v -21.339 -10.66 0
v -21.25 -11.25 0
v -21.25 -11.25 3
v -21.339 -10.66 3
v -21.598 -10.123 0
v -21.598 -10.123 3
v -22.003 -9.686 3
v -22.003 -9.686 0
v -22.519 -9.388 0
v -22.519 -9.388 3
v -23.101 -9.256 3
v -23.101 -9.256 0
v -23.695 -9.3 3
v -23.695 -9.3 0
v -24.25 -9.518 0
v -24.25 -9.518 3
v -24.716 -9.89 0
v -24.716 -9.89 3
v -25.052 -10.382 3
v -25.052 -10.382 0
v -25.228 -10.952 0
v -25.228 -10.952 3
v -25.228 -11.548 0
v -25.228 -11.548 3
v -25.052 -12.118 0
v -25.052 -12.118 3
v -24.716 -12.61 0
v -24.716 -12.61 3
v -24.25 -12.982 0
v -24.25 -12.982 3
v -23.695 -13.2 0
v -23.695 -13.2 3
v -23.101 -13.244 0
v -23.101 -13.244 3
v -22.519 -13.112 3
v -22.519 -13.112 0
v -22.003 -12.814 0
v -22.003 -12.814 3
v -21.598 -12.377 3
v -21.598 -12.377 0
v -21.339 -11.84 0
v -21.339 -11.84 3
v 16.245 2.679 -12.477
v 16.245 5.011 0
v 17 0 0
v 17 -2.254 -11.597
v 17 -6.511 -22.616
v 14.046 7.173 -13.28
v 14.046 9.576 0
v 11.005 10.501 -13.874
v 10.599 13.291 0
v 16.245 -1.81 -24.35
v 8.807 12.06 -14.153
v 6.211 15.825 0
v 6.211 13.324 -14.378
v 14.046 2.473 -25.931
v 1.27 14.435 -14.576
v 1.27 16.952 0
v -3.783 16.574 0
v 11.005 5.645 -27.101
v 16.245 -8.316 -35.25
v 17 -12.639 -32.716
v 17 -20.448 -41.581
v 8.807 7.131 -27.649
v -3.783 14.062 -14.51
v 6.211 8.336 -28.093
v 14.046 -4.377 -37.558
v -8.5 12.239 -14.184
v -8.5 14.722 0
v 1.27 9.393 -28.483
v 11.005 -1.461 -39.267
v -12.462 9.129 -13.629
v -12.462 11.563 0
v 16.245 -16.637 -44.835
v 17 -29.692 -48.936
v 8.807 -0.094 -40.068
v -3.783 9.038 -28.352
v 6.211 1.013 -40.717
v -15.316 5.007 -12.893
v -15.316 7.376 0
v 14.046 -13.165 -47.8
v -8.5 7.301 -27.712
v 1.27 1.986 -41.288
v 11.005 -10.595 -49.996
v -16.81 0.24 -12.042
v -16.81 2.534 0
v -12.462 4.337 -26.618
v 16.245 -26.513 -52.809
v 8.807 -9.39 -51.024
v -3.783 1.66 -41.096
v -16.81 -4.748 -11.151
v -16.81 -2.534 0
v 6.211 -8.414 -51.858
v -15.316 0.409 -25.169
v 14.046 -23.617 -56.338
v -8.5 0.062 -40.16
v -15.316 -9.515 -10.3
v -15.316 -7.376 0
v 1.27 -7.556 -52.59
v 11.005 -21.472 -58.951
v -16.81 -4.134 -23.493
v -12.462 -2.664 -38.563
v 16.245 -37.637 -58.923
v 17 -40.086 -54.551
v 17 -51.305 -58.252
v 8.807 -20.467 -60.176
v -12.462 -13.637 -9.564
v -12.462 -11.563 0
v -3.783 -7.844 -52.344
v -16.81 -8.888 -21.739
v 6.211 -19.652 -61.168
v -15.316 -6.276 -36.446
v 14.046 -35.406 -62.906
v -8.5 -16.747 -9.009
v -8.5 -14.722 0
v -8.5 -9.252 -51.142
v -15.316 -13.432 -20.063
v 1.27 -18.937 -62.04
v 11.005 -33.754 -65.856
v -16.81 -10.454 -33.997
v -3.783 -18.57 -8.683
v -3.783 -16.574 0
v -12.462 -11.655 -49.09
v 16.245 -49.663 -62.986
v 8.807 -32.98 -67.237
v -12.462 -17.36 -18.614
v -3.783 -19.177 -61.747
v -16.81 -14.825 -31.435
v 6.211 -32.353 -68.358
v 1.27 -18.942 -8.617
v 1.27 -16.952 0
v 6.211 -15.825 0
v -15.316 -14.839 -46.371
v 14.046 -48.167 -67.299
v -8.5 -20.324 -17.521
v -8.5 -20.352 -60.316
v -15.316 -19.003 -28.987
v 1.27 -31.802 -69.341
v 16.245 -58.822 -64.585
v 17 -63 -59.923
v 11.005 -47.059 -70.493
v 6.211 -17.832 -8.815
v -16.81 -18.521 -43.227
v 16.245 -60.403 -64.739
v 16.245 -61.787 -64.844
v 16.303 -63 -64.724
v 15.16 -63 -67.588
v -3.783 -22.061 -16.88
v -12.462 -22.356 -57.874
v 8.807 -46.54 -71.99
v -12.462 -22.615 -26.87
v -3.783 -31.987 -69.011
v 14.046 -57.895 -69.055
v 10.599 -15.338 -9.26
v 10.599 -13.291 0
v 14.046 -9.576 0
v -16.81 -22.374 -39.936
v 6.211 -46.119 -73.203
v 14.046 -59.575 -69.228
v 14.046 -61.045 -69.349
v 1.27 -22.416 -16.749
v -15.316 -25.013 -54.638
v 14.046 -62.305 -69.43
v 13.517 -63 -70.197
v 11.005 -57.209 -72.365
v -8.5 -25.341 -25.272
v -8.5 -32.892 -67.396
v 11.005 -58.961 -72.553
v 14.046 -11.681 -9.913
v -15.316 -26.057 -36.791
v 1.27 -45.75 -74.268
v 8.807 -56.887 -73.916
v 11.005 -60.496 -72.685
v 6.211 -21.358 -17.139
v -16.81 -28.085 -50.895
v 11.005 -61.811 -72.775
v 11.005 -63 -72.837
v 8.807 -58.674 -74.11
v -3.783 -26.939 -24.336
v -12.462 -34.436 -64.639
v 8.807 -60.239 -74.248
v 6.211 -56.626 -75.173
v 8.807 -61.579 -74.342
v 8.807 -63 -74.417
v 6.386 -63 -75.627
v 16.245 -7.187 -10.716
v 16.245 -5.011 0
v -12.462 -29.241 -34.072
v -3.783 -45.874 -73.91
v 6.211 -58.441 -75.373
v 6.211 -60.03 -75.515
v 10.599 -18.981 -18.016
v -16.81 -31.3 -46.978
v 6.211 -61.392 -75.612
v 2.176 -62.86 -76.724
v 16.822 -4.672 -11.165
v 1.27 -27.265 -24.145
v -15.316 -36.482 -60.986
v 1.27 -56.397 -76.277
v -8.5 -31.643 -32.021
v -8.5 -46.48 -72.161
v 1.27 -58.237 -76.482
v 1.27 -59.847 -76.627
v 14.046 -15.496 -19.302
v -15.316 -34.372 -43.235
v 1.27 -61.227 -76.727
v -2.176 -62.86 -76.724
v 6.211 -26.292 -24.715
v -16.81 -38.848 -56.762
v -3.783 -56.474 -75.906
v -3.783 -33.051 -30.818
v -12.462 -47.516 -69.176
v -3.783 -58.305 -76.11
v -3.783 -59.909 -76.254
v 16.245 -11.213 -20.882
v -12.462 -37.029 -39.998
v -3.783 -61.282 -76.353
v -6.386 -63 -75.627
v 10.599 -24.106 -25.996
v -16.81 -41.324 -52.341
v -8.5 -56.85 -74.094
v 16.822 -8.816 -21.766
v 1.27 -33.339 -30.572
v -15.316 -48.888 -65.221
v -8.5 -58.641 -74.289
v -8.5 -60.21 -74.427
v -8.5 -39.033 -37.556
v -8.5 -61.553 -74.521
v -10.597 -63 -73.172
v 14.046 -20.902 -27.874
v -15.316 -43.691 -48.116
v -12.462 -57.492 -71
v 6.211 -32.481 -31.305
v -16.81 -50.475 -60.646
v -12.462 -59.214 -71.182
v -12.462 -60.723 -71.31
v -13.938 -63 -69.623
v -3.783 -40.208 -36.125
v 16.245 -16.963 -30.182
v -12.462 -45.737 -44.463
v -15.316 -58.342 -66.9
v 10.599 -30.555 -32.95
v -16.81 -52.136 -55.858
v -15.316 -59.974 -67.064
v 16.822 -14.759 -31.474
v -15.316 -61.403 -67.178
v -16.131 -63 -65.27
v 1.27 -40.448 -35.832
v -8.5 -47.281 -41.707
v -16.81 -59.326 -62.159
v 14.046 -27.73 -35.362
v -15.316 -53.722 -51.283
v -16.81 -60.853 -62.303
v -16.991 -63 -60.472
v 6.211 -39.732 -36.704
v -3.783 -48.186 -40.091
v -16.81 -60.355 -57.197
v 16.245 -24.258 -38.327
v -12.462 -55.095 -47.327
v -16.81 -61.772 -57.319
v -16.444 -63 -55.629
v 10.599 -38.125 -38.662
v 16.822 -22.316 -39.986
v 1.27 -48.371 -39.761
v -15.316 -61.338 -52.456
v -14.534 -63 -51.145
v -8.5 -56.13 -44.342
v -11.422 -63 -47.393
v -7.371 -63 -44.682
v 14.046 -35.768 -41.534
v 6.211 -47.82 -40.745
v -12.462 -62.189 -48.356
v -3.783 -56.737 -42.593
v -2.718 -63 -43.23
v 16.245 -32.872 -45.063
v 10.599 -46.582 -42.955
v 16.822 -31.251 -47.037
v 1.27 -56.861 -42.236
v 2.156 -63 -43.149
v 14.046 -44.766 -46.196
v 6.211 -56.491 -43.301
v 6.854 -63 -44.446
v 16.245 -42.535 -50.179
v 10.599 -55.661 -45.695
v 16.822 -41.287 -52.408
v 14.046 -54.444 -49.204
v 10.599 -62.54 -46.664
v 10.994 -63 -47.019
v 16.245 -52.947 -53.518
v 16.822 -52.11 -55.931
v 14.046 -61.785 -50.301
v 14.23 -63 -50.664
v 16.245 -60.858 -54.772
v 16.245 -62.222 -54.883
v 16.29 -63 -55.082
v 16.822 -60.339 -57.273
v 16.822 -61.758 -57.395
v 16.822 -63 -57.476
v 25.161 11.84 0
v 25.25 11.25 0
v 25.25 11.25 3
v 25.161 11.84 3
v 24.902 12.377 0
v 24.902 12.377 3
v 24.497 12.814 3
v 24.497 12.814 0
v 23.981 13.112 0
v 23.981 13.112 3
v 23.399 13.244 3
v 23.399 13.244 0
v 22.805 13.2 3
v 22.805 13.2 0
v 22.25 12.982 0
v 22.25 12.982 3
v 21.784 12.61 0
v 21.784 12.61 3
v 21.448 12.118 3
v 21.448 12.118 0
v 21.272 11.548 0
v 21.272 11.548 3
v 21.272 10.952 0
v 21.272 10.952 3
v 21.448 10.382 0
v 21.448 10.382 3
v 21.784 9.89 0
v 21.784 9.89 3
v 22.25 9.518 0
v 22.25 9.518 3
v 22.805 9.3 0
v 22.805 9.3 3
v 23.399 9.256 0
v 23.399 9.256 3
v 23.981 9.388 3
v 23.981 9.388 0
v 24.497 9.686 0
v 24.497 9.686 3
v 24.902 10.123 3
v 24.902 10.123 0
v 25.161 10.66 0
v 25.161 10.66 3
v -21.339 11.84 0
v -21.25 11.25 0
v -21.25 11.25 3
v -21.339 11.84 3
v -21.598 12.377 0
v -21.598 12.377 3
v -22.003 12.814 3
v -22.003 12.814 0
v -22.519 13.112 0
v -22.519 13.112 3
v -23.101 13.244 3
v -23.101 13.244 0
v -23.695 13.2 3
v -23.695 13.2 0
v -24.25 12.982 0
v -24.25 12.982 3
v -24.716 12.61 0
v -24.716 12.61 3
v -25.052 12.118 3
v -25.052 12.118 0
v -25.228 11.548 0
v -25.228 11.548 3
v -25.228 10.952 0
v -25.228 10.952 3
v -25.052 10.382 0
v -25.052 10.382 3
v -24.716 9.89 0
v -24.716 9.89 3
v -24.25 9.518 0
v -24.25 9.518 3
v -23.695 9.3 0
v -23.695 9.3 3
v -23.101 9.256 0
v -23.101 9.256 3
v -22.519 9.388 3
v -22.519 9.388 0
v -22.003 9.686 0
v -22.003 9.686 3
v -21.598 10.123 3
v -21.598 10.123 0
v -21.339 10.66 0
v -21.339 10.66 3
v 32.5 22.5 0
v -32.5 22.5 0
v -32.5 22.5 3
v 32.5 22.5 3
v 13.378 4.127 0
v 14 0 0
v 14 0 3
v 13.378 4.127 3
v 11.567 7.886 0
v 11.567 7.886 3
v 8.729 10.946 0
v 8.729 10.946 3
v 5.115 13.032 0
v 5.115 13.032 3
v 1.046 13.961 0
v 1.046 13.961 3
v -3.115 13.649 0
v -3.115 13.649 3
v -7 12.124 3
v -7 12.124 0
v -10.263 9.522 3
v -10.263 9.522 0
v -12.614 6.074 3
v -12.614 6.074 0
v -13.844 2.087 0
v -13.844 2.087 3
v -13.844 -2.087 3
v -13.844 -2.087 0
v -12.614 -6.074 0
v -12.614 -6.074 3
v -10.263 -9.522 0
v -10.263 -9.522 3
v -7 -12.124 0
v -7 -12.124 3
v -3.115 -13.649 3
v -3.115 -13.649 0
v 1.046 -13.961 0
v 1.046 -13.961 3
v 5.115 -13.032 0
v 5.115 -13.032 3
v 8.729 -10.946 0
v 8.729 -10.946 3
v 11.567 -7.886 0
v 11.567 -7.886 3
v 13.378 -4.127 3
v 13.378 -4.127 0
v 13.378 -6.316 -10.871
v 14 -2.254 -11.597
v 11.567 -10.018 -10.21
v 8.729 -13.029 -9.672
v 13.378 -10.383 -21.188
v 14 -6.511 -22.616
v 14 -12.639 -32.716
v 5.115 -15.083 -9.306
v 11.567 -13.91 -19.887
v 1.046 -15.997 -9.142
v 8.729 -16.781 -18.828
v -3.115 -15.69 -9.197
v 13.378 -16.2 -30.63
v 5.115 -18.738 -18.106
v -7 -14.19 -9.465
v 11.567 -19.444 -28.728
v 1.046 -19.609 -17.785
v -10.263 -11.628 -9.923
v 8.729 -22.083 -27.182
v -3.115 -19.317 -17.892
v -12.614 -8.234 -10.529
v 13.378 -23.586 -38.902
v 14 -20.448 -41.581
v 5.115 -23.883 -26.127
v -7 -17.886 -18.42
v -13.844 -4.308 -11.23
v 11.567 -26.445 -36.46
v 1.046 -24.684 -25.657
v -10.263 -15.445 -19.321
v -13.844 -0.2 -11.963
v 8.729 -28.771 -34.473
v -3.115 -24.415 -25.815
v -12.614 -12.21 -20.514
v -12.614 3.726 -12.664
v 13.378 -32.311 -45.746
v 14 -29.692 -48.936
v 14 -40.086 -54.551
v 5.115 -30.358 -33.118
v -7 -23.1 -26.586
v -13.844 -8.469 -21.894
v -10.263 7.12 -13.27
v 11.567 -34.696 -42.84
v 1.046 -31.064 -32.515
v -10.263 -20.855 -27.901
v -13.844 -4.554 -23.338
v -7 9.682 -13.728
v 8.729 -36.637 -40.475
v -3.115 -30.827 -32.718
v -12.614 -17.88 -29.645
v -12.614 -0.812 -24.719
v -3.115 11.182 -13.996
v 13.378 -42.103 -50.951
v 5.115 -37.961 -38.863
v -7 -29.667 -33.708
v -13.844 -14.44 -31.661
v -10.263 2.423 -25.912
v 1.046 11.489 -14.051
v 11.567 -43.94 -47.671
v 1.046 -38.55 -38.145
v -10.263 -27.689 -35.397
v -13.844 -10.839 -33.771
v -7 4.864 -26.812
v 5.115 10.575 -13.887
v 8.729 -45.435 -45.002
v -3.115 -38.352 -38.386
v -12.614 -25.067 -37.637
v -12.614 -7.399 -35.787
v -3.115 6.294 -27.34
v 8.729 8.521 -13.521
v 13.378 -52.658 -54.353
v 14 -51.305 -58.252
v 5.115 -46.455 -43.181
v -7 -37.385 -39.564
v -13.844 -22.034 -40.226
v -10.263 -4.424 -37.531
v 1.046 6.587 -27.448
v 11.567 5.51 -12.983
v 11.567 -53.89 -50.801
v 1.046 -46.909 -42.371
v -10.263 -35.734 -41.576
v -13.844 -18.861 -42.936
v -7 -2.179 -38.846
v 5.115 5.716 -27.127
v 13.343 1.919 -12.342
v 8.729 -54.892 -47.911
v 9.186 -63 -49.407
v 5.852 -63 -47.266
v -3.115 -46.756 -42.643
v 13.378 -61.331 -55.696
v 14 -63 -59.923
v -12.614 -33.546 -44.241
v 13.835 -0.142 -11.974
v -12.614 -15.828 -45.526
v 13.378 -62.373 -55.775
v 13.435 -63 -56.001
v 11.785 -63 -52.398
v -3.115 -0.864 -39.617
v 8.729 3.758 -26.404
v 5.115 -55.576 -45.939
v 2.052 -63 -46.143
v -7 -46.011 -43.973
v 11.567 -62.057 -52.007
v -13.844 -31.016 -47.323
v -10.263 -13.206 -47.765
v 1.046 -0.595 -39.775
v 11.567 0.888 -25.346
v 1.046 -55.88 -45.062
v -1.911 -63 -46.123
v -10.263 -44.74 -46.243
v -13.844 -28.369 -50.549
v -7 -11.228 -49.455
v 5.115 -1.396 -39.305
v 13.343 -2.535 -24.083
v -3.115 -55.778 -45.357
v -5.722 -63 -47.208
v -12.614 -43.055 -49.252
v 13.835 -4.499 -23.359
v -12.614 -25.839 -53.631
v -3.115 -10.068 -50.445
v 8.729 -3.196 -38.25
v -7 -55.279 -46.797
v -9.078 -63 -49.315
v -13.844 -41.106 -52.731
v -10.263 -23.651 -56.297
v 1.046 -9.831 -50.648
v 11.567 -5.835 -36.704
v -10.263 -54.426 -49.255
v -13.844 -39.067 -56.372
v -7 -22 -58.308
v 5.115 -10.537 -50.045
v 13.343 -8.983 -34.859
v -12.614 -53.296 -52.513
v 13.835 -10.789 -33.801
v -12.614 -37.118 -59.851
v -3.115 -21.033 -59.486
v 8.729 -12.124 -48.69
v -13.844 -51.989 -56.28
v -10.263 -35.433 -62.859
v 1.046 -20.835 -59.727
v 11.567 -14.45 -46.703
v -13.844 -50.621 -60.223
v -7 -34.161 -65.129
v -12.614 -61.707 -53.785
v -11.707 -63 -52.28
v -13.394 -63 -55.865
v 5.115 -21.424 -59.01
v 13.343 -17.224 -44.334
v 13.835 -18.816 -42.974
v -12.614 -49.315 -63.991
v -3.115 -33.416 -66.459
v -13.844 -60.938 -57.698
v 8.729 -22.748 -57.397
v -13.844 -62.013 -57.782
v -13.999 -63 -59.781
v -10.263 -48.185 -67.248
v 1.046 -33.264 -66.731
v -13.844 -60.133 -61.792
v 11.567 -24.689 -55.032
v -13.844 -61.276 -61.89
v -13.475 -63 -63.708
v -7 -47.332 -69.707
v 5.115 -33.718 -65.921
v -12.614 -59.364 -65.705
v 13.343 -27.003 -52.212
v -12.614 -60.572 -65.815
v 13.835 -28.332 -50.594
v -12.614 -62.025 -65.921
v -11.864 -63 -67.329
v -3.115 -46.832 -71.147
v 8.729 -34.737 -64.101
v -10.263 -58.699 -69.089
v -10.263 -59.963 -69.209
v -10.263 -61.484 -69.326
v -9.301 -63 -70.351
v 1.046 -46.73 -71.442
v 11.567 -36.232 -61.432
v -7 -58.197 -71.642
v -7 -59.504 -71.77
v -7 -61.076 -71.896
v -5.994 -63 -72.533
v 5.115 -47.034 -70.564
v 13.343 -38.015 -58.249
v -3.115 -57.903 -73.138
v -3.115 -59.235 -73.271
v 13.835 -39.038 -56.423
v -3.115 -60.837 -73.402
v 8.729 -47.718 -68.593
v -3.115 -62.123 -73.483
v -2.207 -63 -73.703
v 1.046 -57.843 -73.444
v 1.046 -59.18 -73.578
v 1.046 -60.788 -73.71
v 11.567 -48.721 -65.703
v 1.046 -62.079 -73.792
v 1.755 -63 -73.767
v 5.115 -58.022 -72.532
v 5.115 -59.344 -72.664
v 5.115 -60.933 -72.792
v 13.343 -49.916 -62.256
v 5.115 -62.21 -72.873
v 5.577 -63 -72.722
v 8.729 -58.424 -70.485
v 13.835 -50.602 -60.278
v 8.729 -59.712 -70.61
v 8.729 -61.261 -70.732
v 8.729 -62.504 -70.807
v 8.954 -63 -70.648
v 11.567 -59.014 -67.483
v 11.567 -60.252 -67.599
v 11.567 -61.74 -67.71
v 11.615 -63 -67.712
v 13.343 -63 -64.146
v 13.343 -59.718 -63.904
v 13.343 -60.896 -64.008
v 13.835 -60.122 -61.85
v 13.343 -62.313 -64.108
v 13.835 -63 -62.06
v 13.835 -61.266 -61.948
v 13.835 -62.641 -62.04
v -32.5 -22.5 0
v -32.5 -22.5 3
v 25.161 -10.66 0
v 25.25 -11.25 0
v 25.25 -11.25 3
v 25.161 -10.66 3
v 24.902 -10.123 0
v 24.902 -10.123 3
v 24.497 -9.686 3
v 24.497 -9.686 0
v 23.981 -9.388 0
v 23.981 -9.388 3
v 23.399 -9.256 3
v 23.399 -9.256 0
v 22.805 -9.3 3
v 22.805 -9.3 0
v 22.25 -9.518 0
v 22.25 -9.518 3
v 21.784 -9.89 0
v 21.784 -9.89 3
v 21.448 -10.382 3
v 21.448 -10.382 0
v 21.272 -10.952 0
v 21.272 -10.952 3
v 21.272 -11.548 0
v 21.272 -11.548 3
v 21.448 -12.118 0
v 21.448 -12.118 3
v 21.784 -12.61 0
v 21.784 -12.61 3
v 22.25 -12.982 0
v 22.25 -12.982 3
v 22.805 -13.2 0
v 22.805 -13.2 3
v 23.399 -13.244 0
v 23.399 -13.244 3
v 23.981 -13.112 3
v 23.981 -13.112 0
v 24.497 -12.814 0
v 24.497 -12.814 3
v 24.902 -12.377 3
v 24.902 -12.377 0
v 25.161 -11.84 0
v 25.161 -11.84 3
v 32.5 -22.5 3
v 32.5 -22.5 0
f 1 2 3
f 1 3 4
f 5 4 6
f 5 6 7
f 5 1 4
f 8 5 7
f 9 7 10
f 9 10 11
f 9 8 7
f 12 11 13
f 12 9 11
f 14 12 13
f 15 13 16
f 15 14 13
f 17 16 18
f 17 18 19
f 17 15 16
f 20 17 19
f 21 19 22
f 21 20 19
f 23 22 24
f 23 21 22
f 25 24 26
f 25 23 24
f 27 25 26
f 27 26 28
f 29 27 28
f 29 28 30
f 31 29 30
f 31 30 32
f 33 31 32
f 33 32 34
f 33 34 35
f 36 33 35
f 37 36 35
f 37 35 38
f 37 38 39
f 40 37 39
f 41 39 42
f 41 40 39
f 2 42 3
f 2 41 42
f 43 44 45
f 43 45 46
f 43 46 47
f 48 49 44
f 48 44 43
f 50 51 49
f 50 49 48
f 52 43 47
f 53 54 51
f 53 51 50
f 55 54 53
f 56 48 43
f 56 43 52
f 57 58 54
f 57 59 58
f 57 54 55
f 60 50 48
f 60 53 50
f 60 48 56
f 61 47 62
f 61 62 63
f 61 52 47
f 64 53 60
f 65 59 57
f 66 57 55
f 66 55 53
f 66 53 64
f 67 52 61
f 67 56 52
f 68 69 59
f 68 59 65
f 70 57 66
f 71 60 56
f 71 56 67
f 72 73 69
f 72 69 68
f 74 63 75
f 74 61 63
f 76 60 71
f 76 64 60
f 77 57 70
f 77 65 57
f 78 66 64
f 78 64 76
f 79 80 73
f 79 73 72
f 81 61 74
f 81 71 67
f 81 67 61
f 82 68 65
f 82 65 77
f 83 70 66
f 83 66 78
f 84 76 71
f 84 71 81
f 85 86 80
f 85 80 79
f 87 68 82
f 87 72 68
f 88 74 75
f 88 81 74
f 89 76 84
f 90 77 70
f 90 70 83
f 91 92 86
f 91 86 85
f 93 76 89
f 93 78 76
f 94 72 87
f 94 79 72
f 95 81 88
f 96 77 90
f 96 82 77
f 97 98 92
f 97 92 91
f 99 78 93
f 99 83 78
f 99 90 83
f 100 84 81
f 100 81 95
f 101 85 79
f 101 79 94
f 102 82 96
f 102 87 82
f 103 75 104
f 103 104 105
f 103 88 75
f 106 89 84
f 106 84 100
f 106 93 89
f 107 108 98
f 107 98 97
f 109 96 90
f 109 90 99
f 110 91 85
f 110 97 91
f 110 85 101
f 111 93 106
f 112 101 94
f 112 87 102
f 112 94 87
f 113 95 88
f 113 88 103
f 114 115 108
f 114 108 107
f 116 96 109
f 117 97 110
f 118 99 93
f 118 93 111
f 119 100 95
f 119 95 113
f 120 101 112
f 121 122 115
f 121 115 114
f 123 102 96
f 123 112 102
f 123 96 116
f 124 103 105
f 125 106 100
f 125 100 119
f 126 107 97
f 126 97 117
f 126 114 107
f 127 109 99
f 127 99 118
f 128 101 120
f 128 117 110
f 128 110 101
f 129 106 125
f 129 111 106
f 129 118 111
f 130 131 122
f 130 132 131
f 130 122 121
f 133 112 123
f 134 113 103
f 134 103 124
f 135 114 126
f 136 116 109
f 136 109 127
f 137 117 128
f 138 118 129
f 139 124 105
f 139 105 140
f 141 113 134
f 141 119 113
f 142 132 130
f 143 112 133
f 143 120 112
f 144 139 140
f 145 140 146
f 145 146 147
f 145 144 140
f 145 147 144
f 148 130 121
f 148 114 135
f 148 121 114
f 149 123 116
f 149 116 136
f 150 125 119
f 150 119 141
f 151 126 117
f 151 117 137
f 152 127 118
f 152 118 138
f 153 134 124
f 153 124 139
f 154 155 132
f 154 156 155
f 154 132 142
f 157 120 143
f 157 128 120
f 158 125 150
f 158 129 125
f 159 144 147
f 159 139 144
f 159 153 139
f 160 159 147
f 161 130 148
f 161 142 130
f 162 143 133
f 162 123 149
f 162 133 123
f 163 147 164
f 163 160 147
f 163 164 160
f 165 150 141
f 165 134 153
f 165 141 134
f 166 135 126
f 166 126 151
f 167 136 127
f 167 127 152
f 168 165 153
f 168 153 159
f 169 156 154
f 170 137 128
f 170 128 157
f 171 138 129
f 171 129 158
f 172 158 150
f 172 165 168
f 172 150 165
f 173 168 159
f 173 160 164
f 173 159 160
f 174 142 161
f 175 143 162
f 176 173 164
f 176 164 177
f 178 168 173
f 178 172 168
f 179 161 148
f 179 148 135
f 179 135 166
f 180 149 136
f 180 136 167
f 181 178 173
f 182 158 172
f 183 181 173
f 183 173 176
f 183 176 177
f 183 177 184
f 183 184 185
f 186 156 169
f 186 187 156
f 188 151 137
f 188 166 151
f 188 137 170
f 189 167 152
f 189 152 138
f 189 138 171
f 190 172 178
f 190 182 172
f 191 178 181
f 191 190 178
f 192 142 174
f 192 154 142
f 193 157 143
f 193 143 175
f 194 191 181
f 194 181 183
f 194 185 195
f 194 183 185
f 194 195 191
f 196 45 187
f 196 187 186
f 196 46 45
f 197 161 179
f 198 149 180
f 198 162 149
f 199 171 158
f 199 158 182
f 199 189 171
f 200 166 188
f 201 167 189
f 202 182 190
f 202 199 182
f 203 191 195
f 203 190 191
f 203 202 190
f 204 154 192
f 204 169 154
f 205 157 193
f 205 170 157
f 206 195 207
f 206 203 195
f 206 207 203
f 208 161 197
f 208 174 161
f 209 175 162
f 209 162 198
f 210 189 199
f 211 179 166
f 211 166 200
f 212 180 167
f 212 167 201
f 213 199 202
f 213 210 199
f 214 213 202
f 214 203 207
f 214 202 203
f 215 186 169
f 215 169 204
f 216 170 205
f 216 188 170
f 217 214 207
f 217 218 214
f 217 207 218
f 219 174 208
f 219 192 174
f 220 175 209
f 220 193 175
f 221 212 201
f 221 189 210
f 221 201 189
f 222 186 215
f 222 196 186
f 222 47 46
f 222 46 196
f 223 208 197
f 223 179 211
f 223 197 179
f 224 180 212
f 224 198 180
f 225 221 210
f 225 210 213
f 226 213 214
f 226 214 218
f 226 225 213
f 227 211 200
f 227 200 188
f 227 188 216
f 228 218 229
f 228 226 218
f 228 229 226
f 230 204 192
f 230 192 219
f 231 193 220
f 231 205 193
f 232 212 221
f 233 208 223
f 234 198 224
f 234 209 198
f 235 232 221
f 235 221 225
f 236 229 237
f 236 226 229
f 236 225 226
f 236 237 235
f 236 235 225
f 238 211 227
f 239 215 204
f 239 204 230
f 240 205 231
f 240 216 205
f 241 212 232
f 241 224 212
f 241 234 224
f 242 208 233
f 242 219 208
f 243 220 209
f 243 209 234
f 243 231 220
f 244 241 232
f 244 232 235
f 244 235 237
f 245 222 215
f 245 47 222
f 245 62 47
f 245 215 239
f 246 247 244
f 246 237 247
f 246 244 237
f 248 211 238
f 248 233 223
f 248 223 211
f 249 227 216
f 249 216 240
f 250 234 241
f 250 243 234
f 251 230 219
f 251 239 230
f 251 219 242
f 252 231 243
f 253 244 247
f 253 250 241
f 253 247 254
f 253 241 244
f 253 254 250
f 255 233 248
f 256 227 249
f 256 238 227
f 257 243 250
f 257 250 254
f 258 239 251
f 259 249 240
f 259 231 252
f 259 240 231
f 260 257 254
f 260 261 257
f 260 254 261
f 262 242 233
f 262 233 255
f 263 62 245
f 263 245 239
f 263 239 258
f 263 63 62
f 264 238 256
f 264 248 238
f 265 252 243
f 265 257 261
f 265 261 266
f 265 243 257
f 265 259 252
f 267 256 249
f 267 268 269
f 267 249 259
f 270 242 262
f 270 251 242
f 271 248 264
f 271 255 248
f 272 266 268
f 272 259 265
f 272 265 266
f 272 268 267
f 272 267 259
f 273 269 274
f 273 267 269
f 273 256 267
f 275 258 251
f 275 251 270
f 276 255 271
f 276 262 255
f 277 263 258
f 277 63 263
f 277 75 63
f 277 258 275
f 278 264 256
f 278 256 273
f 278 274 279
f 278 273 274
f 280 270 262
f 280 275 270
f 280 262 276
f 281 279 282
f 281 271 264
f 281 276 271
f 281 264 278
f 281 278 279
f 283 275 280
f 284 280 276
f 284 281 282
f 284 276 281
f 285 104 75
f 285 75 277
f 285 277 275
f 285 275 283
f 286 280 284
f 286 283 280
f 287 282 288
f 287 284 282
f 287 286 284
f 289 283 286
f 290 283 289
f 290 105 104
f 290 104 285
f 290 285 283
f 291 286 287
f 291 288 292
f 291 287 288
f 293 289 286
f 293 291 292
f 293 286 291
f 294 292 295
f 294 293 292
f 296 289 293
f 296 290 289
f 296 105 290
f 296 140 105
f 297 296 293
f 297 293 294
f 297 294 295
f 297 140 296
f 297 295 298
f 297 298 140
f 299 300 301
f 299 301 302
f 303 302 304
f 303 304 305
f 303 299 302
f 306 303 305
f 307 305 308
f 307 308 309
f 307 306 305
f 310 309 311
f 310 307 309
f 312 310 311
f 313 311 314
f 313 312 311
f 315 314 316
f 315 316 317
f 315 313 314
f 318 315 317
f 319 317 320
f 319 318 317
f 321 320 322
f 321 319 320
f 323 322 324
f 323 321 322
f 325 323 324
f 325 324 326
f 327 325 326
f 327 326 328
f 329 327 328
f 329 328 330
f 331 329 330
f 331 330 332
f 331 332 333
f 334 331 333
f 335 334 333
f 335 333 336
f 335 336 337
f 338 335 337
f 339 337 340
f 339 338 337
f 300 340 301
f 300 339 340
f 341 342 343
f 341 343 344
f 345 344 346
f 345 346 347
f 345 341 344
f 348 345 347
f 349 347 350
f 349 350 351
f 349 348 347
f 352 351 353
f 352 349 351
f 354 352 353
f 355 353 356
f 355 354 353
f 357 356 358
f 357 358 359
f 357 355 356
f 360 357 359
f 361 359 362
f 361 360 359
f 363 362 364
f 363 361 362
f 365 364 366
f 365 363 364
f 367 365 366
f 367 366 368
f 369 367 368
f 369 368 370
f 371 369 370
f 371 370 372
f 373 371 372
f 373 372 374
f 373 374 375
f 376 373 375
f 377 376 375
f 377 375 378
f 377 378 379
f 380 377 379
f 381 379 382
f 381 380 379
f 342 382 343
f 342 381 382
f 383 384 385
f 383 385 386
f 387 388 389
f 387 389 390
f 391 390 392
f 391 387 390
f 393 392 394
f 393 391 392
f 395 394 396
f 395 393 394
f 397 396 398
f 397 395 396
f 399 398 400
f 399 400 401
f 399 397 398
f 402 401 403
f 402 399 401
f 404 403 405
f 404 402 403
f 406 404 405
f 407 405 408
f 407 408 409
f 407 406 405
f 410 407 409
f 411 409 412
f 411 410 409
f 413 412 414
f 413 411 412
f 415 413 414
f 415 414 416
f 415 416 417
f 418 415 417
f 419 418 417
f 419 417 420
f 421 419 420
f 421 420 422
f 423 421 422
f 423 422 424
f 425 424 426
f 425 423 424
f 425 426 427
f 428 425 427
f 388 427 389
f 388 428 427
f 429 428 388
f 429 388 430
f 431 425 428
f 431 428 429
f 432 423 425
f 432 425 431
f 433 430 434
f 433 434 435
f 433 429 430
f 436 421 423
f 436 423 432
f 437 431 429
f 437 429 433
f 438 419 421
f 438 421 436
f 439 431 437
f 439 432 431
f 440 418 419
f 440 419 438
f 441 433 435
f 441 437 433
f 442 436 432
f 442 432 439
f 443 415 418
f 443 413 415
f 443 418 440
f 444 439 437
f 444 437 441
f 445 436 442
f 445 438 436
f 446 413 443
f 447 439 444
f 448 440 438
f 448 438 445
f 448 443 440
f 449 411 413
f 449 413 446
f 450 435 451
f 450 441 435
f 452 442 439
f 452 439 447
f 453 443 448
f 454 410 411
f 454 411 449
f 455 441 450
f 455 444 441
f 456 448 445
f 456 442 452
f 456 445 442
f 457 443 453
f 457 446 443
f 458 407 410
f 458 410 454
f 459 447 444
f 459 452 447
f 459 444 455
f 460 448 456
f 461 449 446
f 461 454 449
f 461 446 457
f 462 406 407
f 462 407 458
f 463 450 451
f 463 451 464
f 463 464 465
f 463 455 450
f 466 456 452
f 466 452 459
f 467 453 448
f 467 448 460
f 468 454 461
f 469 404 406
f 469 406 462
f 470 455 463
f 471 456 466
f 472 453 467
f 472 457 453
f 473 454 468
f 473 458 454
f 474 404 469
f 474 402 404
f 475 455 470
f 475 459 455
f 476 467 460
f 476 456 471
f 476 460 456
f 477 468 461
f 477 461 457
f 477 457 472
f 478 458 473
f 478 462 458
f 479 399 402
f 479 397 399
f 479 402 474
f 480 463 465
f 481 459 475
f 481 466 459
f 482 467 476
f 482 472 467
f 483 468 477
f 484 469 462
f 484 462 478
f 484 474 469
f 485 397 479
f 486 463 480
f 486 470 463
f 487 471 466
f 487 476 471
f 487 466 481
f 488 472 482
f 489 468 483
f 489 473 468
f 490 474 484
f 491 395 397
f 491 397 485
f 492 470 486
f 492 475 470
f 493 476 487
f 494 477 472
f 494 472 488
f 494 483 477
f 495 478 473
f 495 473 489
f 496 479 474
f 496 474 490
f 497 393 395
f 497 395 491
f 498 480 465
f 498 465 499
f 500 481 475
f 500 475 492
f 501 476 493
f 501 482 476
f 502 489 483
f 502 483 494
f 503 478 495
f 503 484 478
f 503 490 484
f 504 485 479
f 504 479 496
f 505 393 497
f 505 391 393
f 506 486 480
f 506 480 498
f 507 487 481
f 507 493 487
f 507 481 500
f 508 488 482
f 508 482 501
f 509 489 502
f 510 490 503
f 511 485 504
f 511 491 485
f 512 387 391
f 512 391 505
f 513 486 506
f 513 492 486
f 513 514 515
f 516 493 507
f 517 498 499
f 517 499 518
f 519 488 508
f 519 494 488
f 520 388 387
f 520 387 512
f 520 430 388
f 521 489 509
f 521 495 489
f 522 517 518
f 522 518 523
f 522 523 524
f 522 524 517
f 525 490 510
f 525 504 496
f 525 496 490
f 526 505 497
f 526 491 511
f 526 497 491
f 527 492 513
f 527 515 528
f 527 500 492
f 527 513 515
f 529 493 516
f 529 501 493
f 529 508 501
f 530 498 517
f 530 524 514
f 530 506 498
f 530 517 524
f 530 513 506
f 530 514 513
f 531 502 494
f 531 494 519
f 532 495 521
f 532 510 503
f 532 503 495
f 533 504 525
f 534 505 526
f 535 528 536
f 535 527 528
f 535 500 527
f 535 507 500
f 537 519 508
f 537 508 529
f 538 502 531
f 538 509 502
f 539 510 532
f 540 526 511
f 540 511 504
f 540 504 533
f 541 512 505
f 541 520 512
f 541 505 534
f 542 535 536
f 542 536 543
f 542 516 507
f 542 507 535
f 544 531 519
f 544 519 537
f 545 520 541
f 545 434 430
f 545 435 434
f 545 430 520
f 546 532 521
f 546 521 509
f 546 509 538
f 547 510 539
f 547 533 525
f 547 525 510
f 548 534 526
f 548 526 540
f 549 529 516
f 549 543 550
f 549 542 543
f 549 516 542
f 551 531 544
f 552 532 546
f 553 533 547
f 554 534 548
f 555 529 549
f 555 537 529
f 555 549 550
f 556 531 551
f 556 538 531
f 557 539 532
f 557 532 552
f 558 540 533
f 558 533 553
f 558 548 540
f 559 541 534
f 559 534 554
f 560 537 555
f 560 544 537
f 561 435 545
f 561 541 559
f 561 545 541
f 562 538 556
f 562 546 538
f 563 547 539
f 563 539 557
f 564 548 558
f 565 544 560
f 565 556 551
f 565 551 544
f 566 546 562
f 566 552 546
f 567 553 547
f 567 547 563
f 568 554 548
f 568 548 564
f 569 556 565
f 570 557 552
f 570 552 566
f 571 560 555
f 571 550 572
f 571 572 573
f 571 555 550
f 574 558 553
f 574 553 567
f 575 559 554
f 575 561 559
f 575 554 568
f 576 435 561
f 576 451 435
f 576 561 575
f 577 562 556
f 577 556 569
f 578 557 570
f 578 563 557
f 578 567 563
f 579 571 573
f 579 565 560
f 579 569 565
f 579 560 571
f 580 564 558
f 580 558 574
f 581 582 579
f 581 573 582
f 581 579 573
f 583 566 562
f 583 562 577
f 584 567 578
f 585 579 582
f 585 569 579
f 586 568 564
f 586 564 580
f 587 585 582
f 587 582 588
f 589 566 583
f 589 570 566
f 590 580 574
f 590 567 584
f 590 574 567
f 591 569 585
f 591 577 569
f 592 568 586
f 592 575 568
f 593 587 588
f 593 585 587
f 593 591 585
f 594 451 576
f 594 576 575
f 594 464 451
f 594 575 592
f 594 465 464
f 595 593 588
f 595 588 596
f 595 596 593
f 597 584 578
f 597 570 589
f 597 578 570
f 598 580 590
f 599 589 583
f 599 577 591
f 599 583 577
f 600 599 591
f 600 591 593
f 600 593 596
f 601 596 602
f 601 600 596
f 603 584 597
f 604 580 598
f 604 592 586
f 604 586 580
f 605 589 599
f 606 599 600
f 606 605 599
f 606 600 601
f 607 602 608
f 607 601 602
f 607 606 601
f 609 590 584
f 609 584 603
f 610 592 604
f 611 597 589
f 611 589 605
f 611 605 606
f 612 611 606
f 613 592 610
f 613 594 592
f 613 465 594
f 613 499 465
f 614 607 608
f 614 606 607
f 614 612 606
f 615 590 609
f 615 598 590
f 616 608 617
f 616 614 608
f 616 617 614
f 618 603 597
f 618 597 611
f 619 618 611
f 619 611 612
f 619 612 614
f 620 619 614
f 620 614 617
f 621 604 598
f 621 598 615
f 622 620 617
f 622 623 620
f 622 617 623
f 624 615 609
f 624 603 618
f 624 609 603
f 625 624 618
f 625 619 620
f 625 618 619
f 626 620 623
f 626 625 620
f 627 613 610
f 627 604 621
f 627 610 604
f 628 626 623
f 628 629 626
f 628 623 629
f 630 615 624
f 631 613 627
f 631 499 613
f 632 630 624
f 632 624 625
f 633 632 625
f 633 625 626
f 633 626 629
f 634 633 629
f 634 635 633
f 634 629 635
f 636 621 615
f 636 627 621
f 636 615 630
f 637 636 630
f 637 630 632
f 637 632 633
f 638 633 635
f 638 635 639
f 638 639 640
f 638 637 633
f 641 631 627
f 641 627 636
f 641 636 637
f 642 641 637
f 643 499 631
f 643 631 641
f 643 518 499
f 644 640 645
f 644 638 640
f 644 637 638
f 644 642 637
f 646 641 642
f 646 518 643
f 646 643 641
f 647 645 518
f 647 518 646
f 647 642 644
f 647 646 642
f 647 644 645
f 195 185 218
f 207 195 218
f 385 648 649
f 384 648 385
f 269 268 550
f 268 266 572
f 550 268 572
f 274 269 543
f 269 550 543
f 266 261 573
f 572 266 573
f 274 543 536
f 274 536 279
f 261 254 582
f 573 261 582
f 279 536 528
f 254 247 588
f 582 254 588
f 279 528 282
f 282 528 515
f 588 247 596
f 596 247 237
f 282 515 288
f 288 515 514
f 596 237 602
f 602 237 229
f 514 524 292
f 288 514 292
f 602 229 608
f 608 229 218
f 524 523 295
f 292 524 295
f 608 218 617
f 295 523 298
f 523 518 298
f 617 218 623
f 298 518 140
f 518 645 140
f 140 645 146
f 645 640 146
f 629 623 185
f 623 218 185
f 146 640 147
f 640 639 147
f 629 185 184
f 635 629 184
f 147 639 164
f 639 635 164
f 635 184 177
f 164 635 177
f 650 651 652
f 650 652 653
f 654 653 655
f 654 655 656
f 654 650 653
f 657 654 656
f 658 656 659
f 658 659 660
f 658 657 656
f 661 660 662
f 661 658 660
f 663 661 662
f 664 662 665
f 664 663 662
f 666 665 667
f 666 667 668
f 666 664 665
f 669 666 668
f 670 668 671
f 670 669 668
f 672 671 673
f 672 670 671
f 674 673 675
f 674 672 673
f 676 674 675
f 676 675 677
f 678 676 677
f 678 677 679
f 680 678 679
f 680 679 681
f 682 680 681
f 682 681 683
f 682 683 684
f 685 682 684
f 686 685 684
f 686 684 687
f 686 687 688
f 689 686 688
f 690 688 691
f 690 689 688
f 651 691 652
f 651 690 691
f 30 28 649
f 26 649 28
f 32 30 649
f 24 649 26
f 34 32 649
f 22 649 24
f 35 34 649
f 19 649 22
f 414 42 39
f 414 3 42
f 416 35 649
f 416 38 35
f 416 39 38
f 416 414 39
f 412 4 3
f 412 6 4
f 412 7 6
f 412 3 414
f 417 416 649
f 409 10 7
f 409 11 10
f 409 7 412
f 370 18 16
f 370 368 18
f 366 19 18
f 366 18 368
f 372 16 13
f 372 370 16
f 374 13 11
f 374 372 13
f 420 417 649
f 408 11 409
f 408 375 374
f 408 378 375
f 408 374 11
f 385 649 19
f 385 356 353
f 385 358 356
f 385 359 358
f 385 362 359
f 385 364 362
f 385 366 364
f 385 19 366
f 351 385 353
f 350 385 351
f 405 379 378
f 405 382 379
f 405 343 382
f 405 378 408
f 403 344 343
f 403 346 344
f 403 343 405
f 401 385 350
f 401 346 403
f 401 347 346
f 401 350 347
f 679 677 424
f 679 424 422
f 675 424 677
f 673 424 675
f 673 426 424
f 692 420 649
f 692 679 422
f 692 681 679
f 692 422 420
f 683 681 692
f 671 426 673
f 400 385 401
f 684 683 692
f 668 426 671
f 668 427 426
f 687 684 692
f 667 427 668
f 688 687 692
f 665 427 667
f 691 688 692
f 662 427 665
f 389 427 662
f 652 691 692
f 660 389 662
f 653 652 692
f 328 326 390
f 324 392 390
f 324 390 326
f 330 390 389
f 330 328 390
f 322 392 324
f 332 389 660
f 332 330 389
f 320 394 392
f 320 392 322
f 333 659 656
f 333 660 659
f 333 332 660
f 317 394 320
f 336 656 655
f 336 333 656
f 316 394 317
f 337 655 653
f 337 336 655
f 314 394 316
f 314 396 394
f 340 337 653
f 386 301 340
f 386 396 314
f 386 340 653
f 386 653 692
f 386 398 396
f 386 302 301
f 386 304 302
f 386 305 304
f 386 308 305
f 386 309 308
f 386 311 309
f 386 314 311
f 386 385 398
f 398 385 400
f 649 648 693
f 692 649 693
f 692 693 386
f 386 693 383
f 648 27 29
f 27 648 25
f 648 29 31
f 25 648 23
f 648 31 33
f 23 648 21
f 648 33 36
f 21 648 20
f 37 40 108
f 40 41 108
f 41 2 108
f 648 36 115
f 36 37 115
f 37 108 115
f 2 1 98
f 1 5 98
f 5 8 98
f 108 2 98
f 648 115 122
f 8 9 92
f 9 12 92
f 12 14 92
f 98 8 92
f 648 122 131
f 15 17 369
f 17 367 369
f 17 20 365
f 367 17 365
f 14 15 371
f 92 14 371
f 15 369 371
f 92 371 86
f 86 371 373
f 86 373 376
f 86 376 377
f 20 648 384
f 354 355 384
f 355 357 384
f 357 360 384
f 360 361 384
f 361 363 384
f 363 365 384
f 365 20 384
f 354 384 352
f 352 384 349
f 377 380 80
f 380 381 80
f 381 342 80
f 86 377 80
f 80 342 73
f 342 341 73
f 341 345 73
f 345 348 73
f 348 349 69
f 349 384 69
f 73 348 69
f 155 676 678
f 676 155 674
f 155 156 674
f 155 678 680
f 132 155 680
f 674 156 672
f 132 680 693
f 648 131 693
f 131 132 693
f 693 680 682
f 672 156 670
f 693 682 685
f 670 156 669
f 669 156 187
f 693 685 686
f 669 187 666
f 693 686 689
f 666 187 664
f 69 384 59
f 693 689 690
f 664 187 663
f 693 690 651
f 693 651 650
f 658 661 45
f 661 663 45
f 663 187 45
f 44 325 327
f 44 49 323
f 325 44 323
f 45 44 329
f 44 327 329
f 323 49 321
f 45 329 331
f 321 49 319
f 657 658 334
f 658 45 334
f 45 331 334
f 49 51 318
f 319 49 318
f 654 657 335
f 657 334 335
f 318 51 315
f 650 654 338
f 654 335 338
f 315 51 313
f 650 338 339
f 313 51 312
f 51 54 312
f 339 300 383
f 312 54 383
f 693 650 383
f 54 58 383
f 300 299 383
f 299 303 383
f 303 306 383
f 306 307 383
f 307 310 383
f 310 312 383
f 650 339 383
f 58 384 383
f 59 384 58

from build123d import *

# Parameters (mm, degrees)
ESQUISSE1_R             = 17
ESQUISSE1_R_2           = 14
ESQUISSE3_W             = 65
ESQUISSE3_H             = 45
ESQUISSE3_R             = 14
ESQUISSE3_R_2           = 2
BOSS_EXTRU_1_DEPTH      = 3
ESQUISSE4_W             = 56.431647226
ESQUISSE4_H             = 36.329386627
ENL_V_MAT_EXTRU_1_DEPTH = 10


with BuildPart() as part:
    # Balayage1: sweep along a path in Esquisse2
    with BuildLine(Plane(origin=(0, 0, 0), x_dir=(0, 0, -1), z_dir=(1, 0, 0))) as balayage1_path:
        ThreePointArc((0, 0), (42.265649833, -21.177861693), (60, -65))
    # Esquisse1 → Balayage1 (sweep)
    with BuildSketch(Plane.XY):
        Circle(ESQUISSE1_R)
        Circle(ESQUISSE1_R_2, mode=Mode.SUBTRACT)
    sweep(path=balayage1_path.line)

    # Esquisse3 → Boss.-Extru.1 (add)
    with BuildSketch(Plane.XY):
        Rectangle(ESQUISSE3_W, ESQUISSE3_H)
        Circle(ESQUISSE3_R, mode=Mode.SUBTRACT)
        with Locations((-23.25, 11.25)):
            Circle(ESQUISSE3_R_2, mode=Mode.SUBTRACT)
        with Locations((-23.25, -11.25)):
            Circle(ESQUISSE3_R_2, mode=Mode.SUBTRACT)
        with Locations((23.25, -11.25)):
            Circle(ESQUISSE3_R_2, mode=Mode.SUBTRACT)
        with Locations((23.25, 11.25)):
            Circle(ESQUISSE3_R_2, mode=Mode.SUBTRACT)
    extrude(amount=BOSS_EXTRU_1_DEPTH)

    # Esquisse4 → Enlèv. mat.-Extru.1 (cut)
    with BuildSketch(Plane(origin=(0, -63, 0), x_dir=(1, 0, 0), z_dir=(0, 1, 0))):
        with Locations((0, 60.039216013)):
            Rectangle(ESQUISSE4_W, ESQUISSE4_H)
    extrude(amount=-ENL_V_MAT_EXTRU_1_DEPTH, mode=Mode.SUBTRACT)


solid = part.part
